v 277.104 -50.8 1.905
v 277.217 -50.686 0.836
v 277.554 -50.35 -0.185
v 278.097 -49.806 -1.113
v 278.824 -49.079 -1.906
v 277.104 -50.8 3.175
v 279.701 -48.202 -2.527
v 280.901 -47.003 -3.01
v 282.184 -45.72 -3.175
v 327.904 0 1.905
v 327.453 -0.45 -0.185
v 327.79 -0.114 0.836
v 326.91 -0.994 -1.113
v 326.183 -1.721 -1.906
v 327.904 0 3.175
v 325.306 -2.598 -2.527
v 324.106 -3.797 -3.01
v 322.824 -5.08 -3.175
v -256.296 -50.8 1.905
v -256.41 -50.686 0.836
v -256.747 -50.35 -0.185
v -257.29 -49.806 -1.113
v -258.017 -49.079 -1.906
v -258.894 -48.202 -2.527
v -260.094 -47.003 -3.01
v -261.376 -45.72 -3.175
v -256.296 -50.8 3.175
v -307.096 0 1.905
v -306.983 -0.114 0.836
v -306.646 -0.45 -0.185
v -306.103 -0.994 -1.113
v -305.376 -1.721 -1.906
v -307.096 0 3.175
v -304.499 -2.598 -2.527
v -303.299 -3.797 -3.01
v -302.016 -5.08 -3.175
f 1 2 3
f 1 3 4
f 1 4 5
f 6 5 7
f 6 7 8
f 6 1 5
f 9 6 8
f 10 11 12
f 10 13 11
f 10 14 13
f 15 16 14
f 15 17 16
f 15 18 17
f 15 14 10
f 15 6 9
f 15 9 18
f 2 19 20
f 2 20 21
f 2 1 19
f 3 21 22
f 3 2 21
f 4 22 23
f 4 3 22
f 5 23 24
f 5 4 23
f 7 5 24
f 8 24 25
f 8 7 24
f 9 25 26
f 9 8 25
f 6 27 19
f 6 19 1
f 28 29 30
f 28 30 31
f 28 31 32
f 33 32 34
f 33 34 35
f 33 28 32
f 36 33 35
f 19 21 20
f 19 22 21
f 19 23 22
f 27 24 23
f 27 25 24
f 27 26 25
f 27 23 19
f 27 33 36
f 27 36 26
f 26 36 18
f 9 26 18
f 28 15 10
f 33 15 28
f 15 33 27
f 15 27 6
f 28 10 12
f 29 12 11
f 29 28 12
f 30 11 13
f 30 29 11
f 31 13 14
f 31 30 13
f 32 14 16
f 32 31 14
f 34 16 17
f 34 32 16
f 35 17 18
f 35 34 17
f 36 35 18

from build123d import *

# Parameters (mm, degrees)
F1_DEPTH = 3.175
F2_R     = 5.08


with BuildPart() as f1:
    # F0 (on Top) → F1 (new body, symmetric)
    with BuildSketch(Plane.XY):
        Polygon((327.903505, 0), (-307.096495, 0), (-256.296495, -50.8), (277.103505, -50.8), align=None)
    extrude(amount=F1_DEPTH, both=True)

    # F2
    f2_edges = [f1.edges().sort_by_distance(p)[0] for p in [
        (10.403505, 0, -3.175),
        (10.403505, -50.8, -3.175),
    ]]
    fillet(f2_edges, radius=F2_R)


solid = f1.part
